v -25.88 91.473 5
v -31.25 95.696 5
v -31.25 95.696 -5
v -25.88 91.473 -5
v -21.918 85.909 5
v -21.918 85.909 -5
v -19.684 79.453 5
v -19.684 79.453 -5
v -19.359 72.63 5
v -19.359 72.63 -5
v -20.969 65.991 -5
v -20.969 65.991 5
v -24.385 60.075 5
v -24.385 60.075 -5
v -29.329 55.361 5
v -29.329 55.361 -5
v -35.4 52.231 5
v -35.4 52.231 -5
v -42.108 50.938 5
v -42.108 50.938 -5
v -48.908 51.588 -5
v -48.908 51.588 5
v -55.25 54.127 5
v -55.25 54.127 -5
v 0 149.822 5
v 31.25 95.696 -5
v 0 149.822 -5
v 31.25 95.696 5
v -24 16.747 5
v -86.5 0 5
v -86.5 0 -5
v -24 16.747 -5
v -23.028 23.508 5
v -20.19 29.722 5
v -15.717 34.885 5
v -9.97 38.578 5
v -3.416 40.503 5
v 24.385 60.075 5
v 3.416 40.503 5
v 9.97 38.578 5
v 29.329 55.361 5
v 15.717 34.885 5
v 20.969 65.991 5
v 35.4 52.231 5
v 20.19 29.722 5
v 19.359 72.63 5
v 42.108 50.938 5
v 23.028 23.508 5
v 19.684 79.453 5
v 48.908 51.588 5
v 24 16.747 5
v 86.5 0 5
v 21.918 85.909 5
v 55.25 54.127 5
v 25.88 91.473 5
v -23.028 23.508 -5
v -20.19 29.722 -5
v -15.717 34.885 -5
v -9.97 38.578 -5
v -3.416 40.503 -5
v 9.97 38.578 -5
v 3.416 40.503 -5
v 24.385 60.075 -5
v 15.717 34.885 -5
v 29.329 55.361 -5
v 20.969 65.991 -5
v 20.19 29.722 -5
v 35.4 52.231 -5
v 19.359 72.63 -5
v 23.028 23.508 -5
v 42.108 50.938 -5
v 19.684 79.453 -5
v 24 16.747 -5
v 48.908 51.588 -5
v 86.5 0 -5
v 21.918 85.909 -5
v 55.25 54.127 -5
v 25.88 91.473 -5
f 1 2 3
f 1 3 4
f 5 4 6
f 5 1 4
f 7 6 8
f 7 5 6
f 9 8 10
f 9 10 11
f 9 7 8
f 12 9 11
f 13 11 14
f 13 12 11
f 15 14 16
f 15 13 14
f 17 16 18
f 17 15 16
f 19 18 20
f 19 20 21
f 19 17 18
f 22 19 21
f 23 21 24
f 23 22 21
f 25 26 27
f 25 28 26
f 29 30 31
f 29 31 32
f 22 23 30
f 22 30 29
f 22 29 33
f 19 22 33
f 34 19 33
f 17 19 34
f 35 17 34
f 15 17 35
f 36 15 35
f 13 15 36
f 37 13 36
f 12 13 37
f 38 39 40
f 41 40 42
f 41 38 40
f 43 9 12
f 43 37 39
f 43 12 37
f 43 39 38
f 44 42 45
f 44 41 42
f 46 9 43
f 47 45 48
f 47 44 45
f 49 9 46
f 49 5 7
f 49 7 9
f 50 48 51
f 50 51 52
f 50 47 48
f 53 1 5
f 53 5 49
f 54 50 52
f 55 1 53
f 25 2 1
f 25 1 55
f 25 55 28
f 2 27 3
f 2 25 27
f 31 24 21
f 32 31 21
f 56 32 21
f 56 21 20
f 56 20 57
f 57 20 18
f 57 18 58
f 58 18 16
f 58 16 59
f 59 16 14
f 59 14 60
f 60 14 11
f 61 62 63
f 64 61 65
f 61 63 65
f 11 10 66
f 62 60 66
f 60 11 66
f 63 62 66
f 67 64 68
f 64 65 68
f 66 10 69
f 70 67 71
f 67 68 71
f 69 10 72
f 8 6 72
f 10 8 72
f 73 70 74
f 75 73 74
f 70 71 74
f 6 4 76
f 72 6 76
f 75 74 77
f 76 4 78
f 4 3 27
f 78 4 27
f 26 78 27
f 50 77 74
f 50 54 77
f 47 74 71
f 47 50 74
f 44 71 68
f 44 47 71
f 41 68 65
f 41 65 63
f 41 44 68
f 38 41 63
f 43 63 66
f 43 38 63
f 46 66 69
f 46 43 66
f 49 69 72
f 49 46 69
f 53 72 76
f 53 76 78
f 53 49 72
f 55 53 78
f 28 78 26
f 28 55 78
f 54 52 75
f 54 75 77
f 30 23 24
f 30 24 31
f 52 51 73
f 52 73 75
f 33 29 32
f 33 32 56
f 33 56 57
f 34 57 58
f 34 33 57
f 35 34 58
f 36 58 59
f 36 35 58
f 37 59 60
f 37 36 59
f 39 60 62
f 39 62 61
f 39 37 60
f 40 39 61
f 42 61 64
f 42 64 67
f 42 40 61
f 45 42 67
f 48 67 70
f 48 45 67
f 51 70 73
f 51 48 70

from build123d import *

# Parameters (mm, degrees)
BOSS_EXTRUDE1_DEPTH = 5


with BuildPart() as part:
    # Sketch1 → Boss-Extrude1 (new, symmetric)
    with BuildSketch(Plane.XY):
        with BuildLine():
            Line((0, 149.822394855), (-31.25, 95.695807118))
            ThreePointArc((-31.25, 95.695807118), (-22.465390309, 62.911197427), (-55.25, 54.126587737))
            Line((-55.25, 54.126587737), (-86.5, 0))
            Line((-86.5, 0), (-24, 16.746824527))
            ThreePointArc((-24, 16.746824527), (0, 40.746824527), (24, 16.746824527))
            Line((24, 16.746824527), (86.5, 0))
            Line((86.5, 0), (55.25, 54.126587737))
            ThreePointArc((55.25, 54.126587737), (22.465390309, 62.911197427), (31.25, 95.695807118))
            Line((31.25, 95.695807118), (0, 149.822394855))
        make_face()
    extrude(amount=BOSS_EXTRUDE1_DEPTH, both=True)


solid = part.part
